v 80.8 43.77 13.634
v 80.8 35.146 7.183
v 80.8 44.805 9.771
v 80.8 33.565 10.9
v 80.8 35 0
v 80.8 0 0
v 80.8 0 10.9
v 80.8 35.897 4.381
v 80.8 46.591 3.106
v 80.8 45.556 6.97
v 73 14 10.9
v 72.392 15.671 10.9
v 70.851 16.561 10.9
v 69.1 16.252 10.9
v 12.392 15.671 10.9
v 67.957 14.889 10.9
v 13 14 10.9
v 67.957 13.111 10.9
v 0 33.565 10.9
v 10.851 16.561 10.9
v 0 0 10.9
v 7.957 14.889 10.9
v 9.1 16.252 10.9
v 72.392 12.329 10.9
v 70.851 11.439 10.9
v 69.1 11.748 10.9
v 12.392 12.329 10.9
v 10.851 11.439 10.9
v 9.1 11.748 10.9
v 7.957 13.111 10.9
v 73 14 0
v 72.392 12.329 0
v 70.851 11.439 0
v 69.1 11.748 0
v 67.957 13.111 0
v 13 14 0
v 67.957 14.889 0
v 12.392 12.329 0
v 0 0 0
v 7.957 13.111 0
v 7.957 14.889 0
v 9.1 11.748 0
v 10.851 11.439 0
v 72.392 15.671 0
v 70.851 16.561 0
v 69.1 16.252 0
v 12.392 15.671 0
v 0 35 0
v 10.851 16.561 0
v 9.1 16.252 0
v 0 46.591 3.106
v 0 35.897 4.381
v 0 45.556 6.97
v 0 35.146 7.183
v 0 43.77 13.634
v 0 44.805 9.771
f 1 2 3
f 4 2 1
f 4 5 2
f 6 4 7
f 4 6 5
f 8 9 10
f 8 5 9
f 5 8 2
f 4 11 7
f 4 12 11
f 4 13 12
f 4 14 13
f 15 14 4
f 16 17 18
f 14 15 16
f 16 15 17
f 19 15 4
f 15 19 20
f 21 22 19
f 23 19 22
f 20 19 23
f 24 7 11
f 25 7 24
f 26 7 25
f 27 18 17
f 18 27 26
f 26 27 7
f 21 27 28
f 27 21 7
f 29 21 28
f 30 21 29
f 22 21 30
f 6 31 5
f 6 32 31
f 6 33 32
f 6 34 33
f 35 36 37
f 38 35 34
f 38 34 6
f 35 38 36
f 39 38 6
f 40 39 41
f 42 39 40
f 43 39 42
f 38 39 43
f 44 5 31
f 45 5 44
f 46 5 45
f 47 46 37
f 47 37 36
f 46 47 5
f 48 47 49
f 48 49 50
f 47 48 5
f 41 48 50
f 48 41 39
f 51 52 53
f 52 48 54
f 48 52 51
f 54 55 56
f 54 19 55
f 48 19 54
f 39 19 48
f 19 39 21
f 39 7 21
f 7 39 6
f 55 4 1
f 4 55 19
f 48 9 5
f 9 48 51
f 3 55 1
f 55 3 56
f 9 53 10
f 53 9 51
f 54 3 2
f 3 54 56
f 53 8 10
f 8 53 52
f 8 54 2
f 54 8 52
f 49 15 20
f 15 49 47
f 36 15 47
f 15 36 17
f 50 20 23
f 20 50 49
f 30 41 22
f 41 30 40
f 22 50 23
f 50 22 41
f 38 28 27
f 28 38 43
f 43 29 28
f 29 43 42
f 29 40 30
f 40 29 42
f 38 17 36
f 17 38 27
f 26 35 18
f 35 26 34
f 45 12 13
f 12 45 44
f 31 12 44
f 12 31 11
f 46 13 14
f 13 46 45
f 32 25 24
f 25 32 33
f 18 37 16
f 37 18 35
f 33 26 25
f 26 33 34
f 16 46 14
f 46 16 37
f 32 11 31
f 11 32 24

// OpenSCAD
hole = 5.2;
d = 60;
h = 35;
l = 15;
g=2.9;
t = 8+g;
w = d+(4*hole);

difference([]){
    union(){
        cube([w,h, t]);
        translate([0,h,0]) rotate([l,0,0]) cube([d+(4*hole),12, t]);
        //translate([0,h,0]) rotate([l,0,0]) translate([0,0,t+3]) cube([d+(4*hole),12, t]);
        
    }
    translate([-1,h,0]) rotate([l,0,0]) translate([0,2,4]) cube([d+(4*hole)+2,10.5, g]);
    translate([hole + hole, h * 0.4, -1]) cylinder(d=hole, h=t+ 2);
    translate([hole + hole + 60, h * 0.4, -1]) cylinder(d=hole, h=t+ 2);
}
